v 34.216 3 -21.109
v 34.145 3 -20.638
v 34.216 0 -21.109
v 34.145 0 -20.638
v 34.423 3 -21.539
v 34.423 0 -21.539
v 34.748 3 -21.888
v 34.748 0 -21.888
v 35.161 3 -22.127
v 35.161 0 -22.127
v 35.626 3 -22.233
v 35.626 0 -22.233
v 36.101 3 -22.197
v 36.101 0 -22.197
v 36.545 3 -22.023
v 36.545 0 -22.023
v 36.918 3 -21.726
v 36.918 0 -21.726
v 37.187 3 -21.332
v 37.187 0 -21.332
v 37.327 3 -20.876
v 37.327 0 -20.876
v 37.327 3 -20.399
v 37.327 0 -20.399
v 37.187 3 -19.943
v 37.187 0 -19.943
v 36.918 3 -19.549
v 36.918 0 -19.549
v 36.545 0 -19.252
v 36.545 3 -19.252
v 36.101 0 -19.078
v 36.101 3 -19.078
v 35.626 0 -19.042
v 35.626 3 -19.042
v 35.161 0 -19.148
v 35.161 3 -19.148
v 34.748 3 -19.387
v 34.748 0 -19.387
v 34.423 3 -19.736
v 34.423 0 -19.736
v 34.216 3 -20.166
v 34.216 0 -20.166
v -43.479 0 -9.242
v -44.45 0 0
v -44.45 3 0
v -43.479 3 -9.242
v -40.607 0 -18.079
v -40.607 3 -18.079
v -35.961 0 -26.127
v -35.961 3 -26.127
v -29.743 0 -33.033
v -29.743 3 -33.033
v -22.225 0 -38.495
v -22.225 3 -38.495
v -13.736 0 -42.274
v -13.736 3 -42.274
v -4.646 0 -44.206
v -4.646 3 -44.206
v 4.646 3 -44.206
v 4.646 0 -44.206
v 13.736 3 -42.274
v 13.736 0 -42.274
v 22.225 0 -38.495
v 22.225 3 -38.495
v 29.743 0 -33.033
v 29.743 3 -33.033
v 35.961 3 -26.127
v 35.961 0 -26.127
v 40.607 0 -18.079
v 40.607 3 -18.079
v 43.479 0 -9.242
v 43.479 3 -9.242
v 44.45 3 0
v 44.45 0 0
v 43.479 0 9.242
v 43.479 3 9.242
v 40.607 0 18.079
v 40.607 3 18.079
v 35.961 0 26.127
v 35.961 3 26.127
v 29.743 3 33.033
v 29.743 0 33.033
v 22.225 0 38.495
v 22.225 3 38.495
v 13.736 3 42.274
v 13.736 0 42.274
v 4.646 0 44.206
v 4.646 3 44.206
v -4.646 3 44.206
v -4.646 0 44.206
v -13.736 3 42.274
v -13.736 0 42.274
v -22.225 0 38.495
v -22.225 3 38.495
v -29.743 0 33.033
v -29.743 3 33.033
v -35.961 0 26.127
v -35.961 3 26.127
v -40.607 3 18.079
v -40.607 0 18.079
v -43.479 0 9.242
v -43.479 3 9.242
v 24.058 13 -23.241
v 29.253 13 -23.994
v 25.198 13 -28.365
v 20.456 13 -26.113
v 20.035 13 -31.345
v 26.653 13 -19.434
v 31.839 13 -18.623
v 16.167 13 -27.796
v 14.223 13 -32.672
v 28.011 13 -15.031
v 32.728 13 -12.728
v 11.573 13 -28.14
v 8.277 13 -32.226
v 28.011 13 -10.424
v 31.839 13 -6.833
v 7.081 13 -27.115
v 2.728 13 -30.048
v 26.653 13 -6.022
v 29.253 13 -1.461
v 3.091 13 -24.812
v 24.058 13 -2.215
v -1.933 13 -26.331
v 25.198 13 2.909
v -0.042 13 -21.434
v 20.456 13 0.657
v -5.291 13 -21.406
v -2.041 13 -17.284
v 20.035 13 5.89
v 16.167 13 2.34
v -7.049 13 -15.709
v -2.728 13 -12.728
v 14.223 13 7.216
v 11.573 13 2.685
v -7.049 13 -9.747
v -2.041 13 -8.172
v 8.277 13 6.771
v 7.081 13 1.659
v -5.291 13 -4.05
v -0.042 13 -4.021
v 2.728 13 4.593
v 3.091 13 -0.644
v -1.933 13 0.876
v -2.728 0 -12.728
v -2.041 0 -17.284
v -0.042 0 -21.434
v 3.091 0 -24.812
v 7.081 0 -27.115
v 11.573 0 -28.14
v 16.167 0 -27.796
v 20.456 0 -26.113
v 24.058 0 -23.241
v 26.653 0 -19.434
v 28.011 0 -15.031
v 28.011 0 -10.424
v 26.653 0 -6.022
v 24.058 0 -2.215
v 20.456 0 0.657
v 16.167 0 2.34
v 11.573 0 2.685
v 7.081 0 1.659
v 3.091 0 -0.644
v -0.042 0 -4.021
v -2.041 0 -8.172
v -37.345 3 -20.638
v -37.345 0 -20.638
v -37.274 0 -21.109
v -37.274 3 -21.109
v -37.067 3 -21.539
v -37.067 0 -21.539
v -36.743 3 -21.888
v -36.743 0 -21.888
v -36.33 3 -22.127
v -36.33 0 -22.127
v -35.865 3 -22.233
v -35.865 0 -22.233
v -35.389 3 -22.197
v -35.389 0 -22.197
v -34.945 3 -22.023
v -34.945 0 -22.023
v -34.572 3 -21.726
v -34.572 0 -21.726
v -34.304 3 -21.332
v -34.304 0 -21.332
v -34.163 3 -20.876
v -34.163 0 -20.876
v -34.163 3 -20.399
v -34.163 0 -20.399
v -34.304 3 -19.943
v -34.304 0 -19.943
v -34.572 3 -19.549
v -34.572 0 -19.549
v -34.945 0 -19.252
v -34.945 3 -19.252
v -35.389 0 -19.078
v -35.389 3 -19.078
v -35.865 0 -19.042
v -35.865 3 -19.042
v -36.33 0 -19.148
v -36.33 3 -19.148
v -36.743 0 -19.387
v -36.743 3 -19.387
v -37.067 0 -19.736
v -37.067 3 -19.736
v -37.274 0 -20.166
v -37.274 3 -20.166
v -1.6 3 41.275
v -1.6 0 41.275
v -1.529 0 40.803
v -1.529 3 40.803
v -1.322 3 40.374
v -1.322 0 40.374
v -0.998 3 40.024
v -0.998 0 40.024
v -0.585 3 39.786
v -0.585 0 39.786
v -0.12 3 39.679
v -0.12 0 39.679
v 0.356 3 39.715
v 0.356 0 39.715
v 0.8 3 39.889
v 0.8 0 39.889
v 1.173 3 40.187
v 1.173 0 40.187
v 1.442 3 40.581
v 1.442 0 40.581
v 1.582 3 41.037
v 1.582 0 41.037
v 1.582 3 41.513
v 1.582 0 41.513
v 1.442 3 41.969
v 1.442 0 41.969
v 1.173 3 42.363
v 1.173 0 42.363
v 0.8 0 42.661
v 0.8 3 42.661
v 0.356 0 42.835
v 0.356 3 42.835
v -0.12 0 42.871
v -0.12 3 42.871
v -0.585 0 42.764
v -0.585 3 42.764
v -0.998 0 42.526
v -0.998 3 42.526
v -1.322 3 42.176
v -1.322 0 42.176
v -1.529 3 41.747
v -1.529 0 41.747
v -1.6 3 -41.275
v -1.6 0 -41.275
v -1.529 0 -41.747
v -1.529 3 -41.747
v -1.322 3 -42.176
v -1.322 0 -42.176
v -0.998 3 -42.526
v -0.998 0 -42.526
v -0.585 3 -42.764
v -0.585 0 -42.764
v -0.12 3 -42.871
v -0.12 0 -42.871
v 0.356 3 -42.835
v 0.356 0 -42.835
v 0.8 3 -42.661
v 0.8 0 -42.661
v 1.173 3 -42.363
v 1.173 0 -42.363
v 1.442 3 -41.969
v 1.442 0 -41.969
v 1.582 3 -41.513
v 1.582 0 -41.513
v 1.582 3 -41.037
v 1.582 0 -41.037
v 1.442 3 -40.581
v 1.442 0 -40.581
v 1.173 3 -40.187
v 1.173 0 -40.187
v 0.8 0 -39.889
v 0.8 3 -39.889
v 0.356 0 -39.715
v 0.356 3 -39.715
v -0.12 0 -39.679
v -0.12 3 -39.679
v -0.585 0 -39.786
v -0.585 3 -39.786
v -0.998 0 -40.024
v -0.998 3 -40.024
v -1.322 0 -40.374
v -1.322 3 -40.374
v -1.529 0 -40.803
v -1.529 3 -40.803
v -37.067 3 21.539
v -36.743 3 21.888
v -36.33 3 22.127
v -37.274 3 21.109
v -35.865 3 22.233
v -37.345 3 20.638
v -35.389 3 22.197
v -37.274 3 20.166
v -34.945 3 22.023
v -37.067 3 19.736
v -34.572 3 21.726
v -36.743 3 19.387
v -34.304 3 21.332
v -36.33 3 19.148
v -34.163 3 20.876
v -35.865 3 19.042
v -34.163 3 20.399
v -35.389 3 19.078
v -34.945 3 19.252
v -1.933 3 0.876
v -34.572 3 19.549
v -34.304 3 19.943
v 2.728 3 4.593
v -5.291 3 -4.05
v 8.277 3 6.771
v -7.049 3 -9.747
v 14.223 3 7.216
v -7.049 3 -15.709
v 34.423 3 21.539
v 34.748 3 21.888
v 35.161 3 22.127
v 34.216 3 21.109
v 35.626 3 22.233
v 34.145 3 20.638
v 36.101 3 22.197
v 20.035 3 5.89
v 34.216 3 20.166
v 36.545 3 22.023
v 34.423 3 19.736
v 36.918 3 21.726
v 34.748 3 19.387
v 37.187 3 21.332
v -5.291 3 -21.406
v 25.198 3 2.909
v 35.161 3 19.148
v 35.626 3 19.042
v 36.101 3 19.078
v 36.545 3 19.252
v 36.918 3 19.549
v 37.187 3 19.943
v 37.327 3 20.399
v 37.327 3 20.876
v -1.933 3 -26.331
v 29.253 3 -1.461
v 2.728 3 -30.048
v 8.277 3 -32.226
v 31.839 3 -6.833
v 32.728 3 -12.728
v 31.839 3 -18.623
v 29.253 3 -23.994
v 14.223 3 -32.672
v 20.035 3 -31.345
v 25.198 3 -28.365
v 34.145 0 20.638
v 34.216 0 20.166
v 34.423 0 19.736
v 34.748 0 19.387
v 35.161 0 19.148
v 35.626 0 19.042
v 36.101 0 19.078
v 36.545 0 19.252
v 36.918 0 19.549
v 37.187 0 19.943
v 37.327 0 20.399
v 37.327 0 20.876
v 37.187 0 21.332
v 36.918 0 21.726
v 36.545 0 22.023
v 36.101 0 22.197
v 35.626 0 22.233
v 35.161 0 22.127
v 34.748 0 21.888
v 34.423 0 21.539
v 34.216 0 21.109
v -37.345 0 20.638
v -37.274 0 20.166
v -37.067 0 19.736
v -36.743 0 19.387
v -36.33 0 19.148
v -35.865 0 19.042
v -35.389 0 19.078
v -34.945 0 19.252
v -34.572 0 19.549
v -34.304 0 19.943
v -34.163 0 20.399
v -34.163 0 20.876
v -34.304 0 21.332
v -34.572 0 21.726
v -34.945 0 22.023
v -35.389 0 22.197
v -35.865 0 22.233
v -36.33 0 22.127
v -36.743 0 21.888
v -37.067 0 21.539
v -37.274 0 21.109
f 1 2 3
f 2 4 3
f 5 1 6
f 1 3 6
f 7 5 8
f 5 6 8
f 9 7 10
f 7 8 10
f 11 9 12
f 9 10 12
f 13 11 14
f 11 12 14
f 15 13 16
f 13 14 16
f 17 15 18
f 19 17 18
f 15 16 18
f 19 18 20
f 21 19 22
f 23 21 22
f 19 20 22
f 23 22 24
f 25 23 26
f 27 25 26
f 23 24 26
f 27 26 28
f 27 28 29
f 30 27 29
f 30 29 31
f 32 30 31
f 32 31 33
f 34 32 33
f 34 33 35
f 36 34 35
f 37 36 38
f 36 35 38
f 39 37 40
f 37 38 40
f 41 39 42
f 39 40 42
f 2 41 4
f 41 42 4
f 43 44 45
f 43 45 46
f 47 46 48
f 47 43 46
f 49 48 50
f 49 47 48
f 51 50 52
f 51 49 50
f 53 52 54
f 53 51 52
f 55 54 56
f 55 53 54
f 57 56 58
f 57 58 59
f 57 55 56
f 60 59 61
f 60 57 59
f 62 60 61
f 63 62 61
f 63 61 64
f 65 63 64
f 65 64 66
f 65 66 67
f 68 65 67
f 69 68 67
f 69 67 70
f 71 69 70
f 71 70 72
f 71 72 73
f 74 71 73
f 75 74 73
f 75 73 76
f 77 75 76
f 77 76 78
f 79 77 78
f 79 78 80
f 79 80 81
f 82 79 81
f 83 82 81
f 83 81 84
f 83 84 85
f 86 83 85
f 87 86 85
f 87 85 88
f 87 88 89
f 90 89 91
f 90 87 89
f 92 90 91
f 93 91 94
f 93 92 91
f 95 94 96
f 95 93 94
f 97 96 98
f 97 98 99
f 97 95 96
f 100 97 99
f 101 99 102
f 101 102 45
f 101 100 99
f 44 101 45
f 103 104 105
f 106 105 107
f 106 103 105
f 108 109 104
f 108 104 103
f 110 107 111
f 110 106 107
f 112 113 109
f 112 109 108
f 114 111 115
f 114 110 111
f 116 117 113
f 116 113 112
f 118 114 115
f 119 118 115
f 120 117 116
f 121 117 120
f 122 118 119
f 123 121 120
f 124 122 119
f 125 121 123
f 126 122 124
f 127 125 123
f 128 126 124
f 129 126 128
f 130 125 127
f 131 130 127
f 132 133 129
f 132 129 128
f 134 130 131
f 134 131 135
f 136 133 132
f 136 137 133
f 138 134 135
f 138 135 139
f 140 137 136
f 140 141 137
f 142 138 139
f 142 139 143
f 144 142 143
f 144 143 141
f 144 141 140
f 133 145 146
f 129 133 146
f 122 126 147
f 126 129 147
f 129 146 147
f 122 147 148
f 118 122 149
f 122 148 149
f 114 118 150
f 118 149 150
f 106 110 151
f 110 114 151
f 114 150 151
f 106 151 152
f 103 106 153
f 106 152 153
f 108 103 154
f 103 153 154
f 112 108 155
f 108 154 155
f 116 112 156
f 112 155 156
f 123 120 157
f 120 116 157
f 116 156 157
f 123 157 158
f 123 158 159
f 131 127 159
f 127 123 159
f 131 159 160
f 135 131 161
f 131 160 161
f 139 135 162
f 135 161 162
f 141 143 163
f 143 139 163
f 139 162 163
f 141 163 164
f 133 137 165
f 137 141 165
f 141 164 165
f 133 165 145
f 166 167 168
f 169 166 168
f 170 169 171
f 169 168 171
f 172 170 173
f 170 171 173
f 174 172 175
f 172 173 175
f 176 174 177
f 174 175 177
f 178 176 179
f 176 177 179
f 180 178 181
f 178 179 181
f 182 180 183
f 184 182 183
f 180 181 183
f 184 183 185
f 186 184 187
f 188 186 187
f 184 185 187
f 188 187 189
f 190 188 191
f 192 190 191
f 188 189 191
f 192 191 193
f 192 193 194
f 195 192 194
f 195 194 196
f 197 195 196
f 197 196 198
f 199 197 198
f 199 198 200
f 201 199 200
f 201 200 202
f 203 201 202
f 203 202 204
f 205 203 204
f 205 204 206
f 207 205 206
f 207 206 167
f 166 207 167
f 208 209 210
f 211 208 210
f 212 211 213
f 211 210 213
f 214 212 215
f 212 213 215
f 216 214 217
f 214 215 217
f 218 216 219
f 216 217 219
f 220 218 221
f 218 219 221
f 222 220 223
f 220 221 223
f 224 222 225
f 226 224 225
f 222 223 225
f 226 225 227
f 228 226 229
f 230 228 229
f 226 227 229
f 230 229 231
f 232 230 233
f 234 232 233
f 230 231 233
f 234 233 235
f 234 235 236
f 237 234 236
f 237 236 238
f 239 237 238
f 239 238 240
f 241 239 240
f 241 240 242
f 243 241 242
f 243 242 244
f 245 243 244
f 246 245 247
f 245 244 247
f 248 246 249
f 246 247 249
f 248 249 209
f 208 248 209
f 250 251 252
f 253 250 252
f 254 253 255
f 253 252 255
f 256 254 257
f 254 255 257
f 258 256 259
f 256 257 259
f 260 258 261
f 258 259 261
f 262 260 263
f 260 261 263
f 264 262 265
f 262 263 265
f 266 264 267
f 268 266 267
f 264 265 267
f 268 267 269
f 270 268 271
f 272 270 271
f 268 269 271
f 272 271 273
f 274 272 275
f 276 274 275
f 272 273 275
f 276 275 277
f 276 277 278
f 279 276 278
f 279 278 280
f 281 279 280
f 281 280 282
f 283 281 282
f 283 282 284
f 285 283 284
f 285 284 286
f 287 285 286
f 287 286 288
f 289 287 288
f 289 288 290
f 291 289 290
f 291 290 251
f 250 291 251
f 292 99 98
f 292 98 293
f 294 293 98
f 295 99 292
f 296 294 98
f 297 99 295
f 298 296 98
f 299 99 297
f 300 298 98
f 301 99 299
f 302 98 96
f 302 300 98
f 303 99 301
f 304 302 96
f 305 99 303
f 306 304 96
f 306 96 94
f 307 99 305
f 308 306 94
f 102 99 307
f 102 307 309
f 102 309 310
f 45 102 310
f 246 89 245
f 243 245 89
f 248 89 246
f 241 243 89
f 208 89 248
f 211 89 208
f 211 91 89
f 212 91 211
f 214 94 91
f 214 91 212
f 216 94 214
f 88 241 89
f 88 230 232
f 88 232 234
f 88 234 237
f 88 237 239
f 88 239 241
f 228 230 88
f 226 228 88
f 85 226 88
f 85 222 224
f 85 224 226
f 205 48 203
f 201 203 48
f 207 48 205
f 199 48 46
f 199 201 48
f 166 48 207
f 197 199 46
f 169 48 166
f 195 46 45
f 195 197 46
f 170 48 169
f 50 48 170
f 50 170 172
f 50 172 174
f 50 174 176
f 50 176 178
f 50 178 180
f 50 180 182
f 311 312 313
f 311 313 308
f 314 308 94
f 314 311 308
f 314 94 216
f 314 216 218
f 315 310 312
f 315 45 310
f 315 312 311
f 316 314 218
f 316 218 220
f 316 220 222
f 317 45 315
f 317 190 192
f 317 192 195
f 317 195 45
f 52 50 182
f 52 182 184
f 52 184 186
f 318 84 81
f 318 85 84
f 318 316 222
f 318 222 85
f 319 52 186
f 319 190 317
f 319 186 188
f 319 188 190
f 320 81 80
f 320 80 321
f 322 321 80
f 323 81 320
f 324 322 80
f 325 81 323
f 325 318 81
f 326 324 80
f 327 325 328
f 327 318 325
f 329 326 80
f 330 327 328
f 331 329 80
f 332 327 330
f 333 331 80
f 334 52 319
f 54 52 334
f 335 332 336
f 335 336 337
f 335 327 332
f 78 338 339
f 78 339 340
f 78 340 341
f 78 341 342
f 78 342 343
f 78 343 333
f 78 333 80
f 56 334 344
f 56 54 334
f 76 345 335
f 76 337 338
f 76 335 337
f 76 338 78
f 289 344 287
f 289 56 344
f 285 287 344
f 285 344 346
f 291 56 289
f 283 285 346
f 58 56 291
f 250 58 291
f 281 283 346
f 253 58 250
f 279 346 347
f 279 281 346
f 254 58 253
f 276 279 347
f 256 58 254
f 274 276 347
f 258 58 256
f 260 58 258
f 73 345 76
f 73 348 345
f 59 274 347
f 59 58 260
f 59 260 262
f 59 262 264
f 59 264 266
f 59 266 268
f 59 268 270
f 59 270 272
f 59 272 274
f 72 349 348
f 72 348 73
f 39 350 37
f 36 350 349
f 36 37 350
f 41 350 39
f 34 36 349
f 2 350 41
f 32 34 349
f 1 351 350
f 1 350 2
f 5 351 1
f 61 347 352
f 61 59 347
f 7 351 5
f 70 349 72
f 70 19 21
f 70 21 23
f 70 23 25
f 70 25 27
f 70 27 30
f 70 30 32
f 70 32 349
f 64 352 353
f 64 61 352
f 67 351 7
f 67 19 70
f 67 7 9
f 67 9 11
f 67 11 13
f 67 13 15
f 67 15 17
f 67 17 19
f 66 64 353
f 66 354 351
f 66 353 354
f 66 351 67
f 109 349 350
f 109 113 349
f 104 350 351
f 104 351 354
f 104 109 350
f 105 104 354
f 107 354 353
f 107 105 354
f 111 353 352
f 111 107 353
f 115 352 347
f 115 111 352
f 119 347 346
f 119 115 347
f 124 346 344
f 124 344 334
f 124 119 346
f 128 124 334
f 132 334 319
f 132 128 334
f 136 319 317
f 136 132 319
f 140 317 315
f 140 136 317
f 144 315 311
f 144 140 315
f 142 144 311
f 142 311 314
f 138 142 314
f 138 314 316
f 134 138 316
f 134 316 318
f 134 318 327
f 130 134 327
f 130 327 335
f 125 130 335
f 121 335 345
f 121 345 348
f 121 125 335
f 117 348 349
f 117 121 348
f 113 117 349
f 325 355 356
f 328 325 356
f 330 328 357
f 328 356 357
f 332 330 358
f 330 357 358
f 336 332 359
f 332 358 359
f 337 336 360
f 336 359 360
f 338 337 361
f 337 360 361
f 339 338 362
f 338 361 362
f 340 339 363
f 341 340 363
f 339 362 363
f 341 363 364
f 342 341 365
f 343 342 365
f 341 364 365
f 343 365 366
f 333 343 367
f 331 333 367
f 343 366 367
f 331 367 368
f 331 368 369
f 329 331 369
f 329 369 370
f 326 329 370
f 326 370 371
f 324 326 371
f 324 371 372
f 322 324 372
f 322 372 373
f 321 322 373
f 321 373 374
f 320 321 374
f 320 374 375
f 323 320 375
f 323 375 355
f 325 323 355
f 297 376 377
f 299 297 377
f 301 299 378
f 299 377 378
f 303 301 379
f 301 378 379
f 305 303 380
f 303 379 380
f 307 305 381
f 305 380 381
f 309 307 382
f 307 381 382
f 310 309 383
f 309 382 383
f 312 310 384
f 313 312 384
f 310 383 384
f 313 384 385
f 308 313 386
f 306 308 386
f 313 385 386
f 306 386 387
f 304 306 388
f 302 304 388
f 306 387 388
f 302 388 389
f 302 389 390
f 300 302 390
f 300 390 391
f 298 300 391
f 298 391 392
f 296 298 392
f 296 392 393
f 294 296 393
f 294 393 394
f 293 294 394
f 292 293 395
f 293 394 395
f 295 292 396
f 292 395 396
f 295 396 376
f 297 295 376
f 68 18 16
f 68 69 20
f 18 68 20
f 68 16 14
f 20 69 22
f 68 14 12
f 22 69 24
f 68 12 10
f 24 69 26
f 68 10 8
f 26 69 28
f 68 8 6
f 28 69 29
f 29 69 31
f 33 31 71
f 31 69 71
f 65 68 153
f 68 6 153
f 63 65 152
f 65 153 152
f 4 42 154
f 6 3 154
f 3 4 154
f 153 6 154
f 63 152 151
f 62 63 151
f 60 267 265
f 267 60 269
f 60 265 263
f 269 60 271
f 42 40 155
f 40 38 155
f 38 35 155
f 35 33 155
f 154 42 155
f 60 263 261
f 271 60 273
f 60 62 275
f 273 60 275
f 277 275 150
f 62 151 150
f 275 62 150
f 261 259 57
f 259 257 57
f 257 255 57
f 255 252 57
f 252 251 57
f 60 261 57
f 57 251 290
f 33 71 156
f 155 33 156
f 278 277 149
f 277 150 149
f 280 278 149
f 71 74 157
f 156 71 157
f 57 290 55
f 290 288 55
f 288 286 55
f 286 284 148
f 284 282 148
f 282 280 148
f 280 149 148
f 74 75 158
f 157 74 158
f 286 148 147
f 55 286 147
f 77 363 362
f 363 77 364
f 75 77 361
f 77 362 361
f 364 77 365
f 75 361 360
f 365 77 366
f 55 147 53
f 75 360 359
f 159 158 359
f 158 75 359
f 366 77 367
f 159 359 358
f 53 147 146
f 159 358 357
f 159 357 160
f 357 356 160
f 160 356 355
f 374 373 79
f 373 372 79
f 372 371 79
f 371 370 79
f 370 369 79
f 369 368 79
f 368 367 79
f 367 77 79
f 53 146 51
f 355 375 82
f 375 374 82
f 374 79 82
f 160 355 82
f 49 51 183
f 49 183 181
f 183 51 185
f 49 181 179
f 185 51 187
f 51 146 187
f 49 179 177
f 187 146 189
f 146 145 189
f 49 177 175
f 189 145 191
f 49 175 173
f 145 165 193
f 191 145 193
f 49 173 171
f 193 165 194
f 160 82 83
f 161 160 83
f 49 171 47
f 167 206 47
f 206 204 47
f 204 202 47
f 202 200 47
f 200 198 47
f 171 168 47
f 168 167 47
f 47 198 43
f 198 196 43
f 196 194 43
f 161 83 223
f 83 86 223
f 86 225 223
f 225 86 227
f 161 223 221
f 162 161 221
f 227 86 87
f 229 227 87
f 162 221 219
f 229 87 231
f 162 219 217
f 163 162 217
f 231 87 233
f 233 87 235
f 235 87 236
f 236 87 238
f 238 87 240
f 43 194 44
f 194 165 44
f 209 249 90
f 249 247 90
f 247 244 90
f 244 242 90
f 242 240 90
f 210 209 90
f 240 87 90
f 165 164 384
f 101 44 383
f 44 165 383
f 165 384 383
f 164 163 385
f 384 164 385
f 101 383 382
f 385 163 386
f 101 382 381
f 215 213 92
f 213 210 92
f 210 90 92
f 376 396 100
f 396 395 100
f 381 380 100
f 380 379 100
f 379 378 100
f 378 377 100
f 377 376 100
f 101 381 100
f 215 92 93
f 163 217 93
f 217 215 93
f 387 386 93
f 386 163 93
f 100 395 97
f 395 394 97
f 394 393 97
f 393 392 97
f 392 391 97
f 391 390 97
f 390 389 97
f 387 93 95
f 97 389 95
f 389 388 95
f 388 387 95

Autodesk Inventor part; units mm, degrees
ref_plane "YZ Plane" through (0, 0, 0) normal (1, 0, 0) x (0, 1, 0)
ref_plane "XZ Plane" through (0, 0, 0) normal (0, 1, 0) x (-1, 0, 0)
ref_plane "XY Plane" through (0, 0, 0) normal (0, 0, 1) x (1, 0, 0)
sketch "Sketch1" plane through (0, 0, 0) normal (0, 1, 0) x (-1, 0, 0)
  circle A0 centre (0, 0) radius 44.45
  circle A1 centre (0, -41.275) radius 1.6
  circle A2 centre (35.7452, -20.6375) radius 1.6
  circle A3 centre (-35.7452, -20.6375) radius 1.6
  circle A4 centre (0, 41.275) radius 1.6
  circle A5 centre (35.7452, 20.6375) radius 1.6
  circle A6 centre (-35.7452, 20.6375) radius 1.6
  circle A7 centre (-12.7279, -12.7279) radius 15.4558
extrude "Extrusion2" add sketch "Sketch1" along normal blind 13
sketch "Sketch2" plane through (0, 13, 0) normal (0, 1, 0) x (1, 0, 0)
  circle A0 centre (12.7279, 12.7279) radius 15.4558 projected
  circle A1 centre (12.7279, 12.7279) radius 20
  circle A2 centre (0, 0) radius 44.45
  dimension "d27" = 40
extrude "Extrusion3" cut sketch "Sketch2" against normal blind 10 contours A2
properties part number "Potting_Jig_External"
